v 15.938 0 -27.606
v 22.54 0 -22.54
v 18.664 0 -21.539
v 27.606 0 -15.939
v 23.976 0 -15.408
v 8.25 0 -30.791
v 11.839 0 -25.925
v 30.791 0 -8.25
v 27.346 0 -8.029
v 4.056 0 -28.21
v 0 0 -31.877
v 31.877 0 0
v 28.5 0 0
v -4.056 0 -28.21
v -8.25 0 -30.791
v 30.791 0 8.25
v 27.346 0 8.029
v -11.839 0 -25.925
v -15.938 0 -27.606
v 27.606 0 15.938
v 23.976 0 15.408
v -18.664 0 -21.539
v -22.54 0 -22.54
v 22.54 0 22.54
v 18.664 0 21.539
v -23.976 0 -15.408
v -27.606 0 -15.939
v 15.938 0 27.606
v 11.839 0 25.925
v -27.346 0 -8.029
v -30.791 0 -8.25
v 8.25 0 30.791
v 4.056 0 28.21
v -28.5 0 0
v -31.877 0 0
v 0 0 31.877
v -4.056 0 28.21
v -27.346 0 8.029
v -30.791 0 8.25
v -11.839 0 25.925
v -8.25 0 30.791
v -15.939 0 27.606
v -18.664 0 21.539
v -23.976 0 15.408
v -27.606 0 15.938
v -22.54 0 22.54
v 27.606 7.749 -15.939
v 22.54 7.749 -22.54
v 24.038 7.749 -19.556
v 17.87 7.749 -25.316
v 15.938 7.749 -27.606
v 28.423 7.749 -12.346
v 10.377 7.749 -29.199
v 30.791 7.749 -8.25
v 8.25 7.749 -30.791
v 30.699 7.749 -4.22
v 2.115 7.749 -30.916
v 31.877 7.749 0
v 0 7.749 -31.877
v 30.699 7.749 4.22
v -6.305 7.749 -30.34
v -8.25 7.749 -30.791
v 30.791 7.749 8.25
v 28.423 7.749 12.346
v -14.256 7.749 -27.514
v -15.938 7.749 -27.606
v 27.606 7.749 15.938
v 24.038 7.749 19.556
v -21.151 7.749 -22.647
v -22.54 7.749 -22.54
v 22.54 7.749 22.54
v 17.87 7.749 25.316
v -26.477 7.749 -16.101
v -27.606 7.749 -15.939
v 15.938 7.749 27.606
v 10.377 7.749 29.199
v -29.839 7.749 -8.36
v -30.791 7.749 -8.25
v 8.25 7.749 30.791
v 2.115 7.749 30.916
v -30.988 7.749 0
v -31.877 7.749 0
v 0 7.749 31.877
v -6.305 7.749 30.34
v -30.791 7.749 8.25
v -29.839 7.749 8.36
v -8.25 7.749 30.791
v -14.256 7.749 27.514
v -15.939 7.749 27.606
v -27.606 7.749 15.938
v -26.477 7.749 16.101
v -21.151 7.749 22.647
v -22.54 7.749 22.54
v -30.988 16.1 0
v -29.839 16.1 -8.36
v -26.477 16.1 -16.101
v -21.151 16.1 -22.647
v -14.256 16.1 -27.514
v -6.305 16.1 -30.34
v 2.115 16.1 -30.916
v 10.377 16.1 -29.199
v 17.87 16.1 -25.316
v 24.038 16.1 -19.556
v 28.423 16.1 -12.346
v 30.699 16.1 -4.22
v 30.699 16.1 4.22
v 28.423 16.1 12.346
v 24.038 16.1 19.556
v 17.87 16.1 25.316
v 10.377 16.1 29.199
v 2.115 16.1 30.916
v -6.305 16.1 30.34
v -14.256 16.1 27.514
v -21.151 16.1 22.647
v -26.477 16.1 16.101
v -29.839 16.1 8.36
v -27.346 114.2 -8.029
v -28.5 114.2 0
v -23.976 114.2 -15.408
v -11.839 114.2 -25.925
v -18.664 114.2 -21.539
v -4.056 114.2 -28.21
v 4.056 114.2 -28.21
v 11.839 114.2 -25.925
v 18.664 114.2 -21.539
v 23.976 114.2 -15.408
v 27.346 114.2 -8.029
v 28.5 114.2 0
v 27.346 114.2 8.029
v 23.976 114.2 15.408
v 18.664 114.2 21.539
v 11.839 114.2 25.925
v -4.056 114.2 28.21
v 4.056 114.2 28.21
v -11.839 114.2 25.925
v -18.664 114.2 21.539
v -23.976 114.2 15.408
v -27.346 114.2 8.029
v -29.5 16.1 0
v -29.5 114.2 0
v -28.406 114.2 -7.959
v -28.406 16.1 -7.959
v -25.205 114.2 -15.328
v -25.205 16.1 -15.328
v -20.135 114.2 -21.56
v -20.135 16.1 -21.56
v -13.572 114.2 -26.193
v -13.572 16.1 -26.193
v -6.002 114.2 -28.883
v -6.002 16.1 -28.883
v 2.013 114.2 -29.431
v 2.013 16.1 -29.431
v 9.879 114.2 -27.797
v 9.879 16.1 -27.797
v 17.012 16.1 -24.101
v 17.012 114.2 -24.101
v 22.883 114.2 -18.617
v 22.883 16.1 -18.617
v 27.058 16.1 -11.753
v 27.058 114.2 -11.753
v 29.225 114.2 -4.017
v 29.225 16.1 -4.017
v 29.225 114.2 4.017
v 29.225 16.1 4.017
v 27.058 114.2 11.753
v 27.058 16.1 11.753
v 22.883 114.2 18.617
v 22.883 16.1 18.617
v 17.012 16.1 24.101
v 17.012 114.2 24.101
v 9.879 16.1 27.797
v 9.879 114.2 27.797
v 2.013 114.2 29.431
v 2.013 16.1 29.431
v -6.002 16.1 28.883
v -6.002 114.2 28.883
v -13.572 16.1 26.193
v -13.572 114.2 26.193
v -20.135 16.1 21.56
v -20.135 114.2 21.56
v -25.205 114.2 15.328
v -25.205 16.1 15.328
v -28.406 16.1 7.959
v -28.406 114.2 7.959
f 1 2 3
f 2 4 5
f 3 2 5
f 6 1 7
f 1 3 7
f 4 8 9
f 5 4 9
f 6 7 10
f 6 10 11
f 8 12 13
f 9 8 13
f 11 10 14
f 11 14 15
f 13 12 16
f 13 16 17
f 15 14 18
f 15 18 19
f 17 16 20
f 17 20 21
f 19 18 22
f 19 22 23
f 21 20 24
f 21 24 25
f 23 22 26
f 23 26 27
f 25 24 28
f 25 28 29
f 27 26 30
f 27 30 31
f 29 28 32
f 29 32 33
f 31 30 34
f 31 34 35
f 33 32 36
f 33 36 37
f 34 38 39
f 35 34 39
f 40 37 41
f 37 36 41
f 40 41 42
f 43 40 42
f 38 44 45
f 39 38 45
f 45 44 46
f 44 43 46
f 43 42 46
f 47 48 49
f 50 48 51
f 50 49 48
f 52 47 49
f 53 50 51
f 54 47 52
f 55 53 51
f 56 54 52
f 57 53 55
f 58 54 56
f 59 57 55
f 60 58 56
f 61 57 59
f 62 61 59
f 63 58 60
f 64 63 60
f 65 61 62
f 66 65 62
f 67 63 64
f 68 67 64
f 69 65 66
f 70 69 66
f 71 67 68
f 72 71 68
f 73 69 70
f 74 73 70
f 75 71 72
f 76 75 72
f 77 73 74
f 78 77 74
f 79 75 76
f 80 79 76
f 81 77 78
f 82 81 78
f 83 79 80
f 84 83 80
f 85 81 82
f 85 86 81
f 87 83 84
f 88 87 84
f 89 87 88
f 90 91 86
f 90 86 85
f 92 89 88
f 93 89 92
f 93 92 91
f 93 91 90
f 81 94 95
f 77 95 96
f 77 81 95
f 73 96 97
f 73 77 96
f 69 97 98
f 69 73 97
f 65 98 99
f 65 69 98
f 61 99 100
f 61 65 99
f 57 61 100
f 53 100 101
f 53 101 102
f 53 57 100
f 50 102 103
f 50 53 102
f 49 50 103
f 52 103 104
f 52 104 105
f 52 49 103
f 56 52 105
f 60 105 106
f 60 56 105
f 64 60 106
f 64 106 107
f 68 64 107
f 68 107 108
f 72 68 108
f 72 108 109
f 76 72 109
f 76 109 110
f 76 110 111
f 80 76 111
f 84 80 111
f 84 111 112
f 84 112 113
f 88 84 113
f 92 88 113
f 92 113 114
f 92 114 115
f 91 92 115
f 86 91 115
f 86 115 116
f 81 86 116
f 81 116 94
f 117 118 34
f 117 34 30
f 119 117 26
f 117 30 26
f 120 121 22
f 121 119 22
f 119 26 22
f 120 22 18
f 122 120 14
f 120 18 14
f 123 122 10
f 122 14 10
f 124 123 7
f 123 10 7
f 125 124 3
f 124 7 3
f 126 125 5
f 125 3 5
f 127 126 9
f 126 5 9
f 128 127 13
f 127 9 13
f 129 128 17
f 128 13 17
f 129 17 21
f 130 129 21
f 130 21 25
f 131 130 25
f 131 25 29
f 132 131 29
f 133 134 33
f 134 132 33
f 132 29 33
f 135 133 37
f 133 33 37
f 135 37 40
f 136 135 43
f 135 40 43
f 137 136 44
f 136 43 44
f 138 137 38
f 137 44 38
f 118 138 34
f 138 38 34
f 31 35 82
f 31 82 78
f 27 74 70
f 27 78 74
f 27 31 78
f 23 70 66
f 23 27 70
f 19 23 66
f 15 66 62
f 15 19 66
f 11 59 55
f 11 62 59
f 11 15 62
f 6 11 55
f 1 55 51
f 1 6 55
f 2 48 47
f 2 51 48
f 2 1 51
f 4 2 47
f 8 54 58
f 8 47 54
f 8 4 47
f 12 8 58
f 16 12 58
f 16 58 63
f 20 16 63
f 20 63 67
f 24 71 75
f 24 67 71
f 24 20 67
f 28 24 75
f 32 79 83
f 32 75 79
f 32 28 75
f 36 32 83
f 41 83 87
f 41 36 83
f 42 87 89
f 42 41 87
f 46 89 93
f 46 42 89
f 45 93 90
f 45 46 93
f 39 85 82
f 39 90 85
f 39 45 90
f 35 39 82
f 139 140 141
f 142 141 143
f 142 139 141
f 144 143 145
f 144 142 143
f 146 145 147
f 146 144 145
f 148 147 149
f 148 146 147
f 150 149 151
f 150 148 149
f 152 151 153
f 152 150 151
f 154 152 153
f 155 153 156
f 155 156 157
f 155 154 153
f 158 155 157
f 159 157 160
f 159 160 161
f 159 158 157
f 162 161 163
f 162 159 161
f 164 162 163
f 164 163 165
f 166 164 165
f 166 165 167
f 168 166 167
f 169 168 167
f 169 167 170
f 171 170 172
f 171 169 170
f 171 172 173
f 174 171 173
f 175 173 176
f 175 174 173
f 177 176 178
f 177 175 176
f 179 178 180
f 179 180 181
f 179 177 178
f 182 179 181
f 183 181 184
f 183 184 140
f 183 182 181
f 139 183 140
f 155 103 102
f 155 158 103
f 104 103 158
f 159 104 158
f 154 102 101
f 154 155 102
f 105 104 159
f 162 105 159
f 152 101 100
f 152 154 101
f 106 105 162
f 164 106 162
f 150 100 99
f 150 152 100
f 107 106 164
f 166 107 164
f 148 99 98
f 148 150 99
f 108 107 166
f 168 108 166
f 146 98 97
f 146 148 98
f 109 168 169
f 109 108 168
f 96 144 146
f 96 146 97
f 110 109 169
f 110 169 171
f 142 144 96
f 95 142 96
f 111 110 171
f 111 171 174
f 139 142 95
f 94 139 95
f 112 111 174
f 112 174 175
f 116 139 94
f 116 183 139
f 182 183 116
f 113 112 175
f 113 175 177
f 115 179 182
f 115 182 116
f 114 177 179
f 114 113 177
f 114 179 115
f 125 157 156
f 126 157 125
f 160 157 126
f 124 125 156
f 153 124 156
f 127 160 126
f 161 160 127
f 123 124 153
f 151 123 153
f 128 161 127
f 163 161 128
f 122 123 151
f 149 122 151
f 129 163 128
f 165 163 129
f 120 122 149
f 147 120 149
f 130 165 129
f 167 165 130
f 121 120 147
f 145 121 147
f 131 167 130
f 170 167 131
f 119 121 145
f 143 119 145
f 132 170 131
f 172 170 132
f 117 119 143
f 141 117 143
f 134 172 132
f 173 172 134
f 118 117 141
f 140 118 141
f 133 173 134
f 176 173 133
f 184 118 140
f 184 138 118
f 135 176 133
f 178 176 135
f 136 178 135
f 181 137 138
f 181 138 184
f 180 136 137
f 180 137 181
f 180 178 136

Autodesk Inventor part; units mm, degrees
sketch "Sketch1" plane through (0, 0, 0) normal (0, 1, 0) x (-1, 0, 0)
  circle A0 centre (0, 0) radius 28.5
  circle A1 centre (0, 0) radius 31.877
  dimension "d0" = 57
  dimension "d1" = 63.754
extrude "Extrusion1" add sketch "Sketch1" along normal blind 114.2
ref_plane "Work Plane1" through (0, 7.749, 0) normal (0, 1, 0) x (-1, 0, 0)
sketch "Sketch3" plane through (0, 7.749, 0) normal (0, 1, 0) x (-1, 0, 0)
  circle A0 centre (0, 0) radius 31.877
  circle A1 centre (0, 0) radius 30.988
  dimension "d6" = 61.976
extrude "Extrusion2" cut sketch "Sketch3" along normal blind 200
ref_plane "Work Plane2" through (0, 16.1, 0) normal (0, 1, 0) x (-1, 0, 0)
sketch "Sketch4" plane through (0, 16.1, 0) normal (0, 1, 0) x (-1, 0, 0)
  circle A0 centre (0, 0) radius 29.5
  circle A1 centre (0, 0) radius 27.8909
  circle A2 centre (0, 0) radius 33.2417
  dimension "d10" = 59
extrude "Extrusion3" cut sketch "Sketch4" along normal blind 200 contours A2
ref_plane "Work Plane3" through (0, 113.3, 0) normal (0, 1, 0) x (-1, 0, 0)
properties part number "Vacuum Cylinder"
